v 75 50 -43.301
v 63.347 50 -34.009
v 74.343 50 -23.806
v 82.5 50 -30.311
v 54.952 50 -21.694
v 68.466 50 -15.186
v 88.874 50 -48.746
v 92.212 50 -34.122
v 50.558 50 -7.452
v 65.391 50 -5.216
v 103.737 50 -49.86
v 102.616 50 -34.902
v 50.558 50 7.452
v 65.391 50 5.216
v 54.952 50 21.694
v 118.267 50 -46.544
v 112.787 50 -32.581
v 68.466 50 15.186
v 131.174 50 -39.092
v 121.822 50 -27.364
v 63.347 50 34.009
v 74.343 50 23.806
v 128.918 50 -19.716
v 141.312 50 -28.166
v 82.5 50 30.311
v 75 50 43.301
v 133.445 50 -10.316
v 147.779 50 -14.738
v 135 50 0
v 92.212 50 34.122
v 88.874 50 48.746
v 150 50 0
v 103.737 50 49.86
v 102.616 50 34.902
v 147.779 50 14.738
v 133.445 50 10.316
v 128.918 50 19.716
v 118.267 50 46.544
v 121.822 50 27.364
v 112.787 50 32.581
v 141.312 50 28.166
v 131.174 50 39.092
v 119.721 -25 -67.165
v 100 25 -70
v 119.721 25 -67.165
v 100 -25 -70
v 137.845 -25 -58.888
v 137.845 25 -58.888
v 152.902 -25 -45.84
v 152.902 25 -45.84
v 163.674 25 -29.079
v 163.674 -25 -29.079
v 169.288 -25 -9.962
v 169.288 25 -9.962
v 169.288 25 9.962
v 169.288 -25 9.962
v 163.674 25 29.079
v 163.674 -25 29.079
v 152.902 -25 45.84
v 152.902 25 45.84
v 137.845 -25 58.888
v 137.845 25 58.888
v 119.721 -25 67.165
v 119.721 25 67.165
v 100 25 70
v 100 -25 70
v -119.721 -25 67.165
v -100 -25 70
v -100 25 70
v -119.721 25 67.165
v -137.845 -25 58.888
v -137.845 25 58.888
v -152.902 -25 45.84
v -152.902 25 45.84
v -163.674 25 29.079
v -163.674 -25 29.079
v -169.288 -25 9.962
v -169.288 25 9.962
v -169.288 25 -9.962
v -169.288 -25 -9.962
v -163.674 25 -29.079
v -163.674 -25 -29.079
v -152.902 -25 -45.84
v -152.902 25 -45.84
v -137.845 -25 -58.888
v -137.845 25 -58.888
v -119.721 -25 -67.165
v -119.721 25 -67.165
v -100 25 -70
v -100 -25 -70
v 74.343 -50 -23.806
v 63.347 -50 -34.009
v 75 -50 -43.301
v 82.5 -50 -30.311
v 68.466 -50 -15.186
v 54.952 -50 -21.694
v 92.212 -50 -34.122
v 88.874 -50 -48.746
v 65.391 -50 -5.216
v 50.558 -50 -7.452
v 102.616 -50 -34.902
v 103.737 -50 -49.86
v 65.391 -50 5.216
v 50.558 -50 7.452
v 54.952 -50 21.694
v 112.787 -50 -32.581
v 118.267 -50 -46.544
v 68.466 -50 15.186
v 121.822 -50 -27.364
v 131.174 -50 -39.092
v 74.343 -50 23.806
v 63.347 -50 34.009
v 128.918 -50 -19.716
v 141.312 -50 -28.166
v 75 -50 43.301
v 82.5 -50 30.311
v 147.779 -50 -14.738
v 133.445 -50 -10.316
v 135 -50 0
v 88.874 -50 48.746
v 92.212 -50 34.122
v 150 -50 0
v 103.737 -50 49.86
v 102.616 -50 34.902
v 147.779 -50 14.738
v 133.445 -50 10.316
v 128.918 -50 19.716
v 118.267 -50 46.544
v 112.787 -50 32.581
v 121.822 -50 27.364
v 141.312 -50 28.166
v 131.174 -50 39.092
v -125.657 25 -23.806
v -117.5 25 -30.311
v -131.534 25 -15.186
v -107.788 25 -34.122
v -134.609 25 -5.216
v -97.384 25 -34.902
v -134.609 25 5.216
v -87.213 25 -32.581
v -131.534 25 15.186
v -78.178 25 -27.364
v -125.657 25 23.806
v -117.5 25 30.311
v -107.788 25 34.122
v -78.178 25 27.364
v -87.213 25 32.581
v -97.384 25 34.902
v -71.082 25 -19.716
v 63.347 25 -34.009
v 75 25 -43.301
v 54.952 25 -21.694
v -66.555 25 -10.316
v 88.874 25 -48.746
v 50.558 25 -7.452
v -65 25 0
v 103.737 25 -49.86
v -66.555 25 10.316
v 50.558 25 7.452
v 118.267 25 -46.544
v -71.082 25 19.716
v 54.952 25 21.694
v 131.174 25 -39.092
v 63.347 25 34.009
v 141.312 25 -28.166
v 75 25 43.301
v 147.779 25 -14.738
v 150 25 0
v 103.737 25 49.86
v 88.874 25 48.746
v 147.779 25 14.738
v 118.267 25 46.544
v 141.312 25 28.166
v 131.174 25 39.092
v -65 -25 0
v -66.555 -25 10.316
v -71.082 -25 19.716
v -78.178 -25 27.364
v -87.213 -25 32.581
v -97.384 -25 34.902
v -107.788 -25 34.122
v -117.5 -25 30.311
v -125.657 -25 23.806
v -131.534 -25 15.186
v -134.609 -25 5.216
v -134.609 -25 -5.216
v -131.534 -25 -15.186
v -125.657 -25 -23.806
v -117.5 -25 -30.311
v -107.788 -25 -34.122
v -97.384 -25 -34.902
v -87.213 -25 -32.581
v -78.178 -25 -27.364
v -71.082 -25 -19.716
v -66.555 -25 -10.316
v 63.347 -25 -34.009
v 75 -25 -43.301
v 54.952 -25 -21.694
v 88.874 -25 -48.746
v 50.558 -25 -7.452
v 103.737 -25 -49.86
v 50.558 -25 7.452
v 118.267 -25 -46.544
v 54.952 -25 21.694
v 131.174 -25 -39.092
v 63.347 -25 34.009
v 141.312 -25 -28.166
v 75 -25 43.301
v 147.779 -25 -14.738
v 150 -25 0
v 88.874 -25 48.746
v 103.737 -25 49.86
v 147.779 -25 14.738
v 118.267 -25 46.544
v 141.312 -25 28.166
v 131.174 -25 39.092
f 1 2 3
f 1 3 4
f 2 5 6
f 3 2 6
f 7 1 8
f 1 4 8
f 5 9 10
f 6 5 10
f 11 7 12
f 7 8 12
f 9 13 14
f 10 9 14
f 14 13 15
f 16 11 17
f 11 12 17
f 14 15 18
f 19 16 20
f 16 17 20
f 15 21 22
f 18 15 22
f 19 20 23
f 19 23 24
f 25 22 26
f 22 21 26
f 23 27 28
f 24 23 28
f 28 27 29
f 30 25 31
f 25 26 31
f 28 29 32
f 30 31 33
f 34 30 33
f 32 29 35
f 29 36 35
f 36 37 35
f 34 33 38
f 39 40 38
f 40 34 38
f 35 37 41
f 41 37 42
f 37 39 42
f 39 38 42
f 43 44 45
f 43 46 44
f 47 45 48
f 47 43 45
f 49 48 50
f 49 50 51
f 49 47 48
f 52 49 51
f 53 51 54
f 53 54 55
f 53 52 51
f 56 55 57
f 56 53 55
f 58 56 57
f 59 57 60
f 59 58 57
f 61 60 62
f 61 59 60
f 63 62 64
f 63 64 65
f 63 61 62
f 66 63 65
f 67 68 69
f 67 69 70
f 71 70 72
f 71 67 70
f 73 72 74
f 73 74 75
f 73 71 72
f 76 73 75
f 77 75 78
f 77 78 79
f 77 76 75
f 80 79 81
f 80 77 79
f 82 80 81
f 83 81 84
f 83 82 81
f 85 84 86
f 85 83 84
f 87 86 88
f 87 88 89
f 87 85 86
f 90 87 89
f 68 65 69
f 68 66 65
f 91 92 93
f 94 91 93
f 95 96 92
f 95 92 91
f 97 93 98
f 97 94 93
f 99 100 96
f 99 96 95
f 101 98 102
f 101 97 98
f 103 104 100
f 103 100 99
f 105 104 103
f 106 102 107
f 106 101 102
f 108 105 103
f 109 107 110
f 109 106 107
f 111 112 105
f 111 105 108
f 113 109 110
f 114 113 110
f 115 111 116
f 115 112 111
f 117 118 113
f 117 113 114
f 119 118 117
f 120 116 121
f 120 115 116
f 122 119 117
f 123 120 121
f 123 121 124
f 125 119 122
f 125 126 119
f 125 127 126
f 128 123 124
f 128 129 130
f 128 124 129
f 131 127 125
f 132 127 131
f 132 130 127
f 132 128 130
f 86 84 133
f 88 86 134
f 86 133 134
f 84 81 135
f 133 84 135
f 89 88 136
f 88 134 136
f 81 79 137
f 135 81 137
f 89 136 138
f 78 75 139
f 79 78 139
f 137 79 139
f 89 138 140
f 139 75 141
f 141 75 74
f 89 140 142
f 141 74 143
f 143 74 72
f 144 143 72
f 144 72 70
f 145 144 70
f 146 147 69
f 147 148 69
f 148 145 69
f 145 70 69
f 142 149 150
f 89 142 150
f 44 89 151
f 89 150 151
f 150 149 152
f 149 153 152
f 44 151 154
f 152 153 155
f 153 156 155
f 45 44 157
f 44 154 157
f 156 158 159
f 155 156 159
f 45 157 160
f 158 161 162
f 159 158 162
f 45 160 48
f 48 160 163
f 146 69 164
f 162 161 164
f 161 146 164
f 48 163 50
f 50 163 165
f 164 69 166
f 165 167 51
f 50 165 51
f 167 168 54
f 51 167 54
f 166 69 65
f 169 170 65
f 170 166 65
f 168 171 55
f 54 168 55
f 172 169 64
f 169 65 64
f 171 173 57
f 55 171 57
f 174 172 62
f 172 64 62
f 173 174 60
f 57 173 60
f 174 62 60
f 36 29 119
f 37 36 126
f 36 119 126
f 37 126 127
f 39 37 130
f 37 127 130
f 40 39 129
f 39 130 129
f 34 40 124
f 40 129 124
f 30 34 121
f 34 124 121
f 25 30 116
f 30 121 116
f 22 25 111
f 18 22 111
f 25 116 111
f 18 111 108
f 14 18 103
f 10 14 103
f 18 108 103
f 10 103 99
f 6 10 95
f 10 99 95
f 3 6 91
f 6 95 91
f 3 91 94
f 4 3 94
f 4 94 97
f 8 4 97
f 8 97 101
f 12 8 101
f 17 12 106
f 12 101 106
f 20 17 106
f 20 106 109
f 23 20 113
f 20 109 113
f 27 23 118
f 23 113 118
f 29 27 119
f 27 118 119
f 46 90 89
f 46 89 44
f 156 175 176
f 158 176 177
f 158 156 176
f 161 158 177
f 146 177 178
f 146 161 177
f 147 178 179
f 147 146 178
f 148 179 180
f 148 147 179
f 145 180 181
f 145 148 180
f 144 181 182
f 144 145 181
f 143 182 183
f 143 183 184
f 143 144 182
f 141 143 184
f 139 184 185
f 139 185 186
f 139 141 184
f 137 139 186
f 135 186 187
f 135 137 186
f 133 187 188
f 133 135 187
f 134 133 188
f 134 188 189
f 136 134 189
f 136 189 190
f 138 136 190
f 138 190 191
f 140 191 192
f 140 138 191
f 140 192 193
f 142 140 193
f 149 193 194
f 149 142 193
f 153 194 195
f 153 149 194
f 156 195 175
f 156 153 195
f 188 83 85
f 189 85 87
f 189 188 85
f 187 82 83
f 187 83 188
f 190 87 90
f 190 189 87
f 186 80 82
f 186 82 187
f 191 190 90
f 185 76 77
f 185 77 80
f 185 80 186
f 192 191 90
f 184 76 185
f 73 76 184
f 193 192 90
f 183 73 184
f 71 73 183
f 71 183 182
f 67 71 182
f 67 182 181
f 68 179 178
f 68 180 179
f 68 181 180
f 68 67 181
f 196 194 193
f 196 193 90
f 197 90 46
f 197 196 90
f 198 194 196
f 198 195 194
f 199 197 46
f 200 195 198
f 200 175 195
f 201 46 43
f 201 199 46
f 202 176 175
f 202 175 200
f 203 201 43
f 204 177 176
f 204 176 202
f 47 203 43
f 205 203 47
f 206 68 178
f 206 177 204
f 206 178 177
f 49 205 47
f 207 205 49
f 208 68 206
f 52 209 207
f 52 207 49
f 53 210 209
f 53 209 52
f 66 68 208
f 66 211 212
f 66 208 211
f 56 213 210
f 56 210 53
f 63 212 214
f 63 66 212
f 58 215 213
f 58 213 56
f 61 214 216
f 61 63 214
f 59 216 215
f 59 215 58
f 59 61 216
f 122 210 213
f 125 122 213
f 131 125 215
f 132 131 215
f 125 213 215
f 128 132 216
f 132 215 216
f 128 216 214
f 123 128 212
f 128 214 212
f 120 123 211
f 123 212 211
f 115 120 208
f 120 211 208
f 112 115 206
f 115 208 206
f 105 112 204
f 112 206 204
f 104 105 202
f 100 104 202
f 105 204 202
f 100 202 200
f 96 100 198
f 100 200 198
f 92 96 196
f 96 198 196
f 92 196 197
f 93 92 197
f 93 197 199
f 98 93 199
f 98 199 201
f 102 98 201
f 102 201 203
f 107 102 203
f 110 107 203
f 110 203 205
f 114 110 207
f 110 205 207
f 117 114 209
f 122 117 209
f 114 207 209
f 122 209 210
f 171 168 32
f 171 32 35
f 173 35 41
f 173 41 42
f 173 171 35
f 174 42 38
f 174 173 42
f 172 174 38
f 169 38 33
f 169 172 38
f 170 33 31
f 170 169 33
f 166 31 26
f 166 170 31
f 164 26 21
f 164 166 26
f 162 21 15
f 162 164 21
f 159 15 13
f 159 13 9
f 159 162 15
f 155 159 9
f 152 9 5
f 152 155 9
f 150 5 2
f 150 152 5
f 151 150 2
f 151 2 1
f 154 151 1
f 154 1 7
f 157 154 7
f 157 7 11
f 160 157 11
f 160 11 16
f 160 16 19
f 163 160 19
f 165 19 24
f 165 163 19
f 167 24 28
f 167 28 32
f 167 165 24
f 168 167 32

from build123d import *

# Parameters (mm, degrees)
F0_R     = 35
F1_DEPTH = 25
F2_R     = 50
F2_R_2   = 35
F3_DEPTH = 25


# Not quite as in the source:
# - a pattern or mirror of a feature is missing from the dataset's text; its kind, count and spacing are read off the source's solid


with BuildPart() as f1:
    # F0 (on Front) → F1 (new body, symmetric)
    with BuildSketch(Plane.XZ):
        with BuildLine():
            Line((100, 70), (-100, 70))
            ThreePointArc((-100, 70), (-170, 0), (-100, -70))
            Line((-100, -70), (100, -70))
            ThreePointArc((100, -70), (170, 0), (100, 70))
        make_face()
        with Locations((-100, 0)):
            Circle(F0_R, mode=Mode.SUBTRACT)
        with Locations((100, 0)):
            Circle(F0_R, mode=Mode.SUBTRACT)
    extrude(amount=F1_DEPTH, both=True)

    # F2 (on face) → F3 (join)
    with BuildSketch(Plane.XZ.offset(25)):
        with Locations((100, 0)):
            Circle(F2_R)
        with Locations((100, 0)):
            Circle(F2_R_2, mode=Mode.SUBTRACT)
    f3 = extrude(amount=F3_DEPTH)

    # F3_copies: F3 across plane
    add(f3.mirror(Plane.ZX))


solid = f1.part
